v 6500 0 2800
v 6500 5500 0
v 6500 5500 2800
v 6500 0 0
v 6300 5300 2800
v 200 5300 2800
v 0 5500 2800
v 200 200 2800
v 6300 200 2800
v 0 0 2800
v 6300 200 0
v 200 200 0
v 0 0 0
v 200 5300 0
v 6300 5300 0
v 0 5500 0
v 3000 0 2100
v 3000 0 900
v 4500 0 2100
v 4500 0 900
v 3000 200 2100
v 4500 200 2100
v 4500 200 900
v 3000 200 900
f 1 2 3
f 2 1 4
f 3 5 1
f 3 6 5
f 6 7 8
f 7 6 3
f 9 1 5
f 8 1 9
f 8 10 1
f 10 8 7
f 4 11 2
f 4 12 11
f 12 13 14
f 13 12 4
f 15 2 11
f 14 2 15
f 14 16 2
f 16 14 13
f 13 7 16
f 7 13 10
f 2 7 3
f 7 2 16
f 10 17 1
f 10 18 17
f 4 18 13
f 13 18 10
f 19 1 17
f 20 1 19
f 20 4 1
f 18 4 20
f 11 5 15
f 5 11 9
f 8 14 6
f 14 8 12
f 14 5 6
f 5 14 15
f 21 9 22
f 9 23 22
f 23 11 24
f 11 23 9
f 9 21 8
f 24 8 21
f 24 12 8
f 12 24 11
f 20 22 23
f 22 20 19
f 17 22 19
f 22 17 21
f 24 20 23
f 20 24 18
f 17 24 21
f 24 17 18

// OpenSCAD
// Concrete 3D Printed Room - Parametric Design
// All measurements in millimeters (mm)

// === ROOM DIMENSIONS ===
room_length = 6500;        // 5 meters
room_width = 5500;         // 4 meters  
wall_height = 2800;        // 2.8 meters (standard ceiling height)
wall_thickness = 200;      // 20 cm (typical concrete 3D print)

// === WINDOW ===
window_width = 1500;       // 1.5 meters wide
window_height = 1200;      // 1.2 meters tall
window_position = 3000;    // 3 meters from left corner
window_sill_height = 900;  // 90 cm from floor

// === GEOMETRY ===
module room() {
    difference() {
        // Outer walls (solid block)
        cube([room_length, room_width, wall_height]);
        
        // Interior cavity (hollow out the room)
        translate([wall_thickness, wall_thickness, 0])
            cube([
                room_length - 2*wall_thickness,
                room_width - 2*wall_thickness,
                wall_height + 100  // Extra height to ensure clean cut
            ]);
        
        // Window opening (front wall)
        translate([window_position, -10, window_sill_height])
            cube([window_width, wall_thickness + 20, window_height]);
    }
}

// Generate the room
room();
